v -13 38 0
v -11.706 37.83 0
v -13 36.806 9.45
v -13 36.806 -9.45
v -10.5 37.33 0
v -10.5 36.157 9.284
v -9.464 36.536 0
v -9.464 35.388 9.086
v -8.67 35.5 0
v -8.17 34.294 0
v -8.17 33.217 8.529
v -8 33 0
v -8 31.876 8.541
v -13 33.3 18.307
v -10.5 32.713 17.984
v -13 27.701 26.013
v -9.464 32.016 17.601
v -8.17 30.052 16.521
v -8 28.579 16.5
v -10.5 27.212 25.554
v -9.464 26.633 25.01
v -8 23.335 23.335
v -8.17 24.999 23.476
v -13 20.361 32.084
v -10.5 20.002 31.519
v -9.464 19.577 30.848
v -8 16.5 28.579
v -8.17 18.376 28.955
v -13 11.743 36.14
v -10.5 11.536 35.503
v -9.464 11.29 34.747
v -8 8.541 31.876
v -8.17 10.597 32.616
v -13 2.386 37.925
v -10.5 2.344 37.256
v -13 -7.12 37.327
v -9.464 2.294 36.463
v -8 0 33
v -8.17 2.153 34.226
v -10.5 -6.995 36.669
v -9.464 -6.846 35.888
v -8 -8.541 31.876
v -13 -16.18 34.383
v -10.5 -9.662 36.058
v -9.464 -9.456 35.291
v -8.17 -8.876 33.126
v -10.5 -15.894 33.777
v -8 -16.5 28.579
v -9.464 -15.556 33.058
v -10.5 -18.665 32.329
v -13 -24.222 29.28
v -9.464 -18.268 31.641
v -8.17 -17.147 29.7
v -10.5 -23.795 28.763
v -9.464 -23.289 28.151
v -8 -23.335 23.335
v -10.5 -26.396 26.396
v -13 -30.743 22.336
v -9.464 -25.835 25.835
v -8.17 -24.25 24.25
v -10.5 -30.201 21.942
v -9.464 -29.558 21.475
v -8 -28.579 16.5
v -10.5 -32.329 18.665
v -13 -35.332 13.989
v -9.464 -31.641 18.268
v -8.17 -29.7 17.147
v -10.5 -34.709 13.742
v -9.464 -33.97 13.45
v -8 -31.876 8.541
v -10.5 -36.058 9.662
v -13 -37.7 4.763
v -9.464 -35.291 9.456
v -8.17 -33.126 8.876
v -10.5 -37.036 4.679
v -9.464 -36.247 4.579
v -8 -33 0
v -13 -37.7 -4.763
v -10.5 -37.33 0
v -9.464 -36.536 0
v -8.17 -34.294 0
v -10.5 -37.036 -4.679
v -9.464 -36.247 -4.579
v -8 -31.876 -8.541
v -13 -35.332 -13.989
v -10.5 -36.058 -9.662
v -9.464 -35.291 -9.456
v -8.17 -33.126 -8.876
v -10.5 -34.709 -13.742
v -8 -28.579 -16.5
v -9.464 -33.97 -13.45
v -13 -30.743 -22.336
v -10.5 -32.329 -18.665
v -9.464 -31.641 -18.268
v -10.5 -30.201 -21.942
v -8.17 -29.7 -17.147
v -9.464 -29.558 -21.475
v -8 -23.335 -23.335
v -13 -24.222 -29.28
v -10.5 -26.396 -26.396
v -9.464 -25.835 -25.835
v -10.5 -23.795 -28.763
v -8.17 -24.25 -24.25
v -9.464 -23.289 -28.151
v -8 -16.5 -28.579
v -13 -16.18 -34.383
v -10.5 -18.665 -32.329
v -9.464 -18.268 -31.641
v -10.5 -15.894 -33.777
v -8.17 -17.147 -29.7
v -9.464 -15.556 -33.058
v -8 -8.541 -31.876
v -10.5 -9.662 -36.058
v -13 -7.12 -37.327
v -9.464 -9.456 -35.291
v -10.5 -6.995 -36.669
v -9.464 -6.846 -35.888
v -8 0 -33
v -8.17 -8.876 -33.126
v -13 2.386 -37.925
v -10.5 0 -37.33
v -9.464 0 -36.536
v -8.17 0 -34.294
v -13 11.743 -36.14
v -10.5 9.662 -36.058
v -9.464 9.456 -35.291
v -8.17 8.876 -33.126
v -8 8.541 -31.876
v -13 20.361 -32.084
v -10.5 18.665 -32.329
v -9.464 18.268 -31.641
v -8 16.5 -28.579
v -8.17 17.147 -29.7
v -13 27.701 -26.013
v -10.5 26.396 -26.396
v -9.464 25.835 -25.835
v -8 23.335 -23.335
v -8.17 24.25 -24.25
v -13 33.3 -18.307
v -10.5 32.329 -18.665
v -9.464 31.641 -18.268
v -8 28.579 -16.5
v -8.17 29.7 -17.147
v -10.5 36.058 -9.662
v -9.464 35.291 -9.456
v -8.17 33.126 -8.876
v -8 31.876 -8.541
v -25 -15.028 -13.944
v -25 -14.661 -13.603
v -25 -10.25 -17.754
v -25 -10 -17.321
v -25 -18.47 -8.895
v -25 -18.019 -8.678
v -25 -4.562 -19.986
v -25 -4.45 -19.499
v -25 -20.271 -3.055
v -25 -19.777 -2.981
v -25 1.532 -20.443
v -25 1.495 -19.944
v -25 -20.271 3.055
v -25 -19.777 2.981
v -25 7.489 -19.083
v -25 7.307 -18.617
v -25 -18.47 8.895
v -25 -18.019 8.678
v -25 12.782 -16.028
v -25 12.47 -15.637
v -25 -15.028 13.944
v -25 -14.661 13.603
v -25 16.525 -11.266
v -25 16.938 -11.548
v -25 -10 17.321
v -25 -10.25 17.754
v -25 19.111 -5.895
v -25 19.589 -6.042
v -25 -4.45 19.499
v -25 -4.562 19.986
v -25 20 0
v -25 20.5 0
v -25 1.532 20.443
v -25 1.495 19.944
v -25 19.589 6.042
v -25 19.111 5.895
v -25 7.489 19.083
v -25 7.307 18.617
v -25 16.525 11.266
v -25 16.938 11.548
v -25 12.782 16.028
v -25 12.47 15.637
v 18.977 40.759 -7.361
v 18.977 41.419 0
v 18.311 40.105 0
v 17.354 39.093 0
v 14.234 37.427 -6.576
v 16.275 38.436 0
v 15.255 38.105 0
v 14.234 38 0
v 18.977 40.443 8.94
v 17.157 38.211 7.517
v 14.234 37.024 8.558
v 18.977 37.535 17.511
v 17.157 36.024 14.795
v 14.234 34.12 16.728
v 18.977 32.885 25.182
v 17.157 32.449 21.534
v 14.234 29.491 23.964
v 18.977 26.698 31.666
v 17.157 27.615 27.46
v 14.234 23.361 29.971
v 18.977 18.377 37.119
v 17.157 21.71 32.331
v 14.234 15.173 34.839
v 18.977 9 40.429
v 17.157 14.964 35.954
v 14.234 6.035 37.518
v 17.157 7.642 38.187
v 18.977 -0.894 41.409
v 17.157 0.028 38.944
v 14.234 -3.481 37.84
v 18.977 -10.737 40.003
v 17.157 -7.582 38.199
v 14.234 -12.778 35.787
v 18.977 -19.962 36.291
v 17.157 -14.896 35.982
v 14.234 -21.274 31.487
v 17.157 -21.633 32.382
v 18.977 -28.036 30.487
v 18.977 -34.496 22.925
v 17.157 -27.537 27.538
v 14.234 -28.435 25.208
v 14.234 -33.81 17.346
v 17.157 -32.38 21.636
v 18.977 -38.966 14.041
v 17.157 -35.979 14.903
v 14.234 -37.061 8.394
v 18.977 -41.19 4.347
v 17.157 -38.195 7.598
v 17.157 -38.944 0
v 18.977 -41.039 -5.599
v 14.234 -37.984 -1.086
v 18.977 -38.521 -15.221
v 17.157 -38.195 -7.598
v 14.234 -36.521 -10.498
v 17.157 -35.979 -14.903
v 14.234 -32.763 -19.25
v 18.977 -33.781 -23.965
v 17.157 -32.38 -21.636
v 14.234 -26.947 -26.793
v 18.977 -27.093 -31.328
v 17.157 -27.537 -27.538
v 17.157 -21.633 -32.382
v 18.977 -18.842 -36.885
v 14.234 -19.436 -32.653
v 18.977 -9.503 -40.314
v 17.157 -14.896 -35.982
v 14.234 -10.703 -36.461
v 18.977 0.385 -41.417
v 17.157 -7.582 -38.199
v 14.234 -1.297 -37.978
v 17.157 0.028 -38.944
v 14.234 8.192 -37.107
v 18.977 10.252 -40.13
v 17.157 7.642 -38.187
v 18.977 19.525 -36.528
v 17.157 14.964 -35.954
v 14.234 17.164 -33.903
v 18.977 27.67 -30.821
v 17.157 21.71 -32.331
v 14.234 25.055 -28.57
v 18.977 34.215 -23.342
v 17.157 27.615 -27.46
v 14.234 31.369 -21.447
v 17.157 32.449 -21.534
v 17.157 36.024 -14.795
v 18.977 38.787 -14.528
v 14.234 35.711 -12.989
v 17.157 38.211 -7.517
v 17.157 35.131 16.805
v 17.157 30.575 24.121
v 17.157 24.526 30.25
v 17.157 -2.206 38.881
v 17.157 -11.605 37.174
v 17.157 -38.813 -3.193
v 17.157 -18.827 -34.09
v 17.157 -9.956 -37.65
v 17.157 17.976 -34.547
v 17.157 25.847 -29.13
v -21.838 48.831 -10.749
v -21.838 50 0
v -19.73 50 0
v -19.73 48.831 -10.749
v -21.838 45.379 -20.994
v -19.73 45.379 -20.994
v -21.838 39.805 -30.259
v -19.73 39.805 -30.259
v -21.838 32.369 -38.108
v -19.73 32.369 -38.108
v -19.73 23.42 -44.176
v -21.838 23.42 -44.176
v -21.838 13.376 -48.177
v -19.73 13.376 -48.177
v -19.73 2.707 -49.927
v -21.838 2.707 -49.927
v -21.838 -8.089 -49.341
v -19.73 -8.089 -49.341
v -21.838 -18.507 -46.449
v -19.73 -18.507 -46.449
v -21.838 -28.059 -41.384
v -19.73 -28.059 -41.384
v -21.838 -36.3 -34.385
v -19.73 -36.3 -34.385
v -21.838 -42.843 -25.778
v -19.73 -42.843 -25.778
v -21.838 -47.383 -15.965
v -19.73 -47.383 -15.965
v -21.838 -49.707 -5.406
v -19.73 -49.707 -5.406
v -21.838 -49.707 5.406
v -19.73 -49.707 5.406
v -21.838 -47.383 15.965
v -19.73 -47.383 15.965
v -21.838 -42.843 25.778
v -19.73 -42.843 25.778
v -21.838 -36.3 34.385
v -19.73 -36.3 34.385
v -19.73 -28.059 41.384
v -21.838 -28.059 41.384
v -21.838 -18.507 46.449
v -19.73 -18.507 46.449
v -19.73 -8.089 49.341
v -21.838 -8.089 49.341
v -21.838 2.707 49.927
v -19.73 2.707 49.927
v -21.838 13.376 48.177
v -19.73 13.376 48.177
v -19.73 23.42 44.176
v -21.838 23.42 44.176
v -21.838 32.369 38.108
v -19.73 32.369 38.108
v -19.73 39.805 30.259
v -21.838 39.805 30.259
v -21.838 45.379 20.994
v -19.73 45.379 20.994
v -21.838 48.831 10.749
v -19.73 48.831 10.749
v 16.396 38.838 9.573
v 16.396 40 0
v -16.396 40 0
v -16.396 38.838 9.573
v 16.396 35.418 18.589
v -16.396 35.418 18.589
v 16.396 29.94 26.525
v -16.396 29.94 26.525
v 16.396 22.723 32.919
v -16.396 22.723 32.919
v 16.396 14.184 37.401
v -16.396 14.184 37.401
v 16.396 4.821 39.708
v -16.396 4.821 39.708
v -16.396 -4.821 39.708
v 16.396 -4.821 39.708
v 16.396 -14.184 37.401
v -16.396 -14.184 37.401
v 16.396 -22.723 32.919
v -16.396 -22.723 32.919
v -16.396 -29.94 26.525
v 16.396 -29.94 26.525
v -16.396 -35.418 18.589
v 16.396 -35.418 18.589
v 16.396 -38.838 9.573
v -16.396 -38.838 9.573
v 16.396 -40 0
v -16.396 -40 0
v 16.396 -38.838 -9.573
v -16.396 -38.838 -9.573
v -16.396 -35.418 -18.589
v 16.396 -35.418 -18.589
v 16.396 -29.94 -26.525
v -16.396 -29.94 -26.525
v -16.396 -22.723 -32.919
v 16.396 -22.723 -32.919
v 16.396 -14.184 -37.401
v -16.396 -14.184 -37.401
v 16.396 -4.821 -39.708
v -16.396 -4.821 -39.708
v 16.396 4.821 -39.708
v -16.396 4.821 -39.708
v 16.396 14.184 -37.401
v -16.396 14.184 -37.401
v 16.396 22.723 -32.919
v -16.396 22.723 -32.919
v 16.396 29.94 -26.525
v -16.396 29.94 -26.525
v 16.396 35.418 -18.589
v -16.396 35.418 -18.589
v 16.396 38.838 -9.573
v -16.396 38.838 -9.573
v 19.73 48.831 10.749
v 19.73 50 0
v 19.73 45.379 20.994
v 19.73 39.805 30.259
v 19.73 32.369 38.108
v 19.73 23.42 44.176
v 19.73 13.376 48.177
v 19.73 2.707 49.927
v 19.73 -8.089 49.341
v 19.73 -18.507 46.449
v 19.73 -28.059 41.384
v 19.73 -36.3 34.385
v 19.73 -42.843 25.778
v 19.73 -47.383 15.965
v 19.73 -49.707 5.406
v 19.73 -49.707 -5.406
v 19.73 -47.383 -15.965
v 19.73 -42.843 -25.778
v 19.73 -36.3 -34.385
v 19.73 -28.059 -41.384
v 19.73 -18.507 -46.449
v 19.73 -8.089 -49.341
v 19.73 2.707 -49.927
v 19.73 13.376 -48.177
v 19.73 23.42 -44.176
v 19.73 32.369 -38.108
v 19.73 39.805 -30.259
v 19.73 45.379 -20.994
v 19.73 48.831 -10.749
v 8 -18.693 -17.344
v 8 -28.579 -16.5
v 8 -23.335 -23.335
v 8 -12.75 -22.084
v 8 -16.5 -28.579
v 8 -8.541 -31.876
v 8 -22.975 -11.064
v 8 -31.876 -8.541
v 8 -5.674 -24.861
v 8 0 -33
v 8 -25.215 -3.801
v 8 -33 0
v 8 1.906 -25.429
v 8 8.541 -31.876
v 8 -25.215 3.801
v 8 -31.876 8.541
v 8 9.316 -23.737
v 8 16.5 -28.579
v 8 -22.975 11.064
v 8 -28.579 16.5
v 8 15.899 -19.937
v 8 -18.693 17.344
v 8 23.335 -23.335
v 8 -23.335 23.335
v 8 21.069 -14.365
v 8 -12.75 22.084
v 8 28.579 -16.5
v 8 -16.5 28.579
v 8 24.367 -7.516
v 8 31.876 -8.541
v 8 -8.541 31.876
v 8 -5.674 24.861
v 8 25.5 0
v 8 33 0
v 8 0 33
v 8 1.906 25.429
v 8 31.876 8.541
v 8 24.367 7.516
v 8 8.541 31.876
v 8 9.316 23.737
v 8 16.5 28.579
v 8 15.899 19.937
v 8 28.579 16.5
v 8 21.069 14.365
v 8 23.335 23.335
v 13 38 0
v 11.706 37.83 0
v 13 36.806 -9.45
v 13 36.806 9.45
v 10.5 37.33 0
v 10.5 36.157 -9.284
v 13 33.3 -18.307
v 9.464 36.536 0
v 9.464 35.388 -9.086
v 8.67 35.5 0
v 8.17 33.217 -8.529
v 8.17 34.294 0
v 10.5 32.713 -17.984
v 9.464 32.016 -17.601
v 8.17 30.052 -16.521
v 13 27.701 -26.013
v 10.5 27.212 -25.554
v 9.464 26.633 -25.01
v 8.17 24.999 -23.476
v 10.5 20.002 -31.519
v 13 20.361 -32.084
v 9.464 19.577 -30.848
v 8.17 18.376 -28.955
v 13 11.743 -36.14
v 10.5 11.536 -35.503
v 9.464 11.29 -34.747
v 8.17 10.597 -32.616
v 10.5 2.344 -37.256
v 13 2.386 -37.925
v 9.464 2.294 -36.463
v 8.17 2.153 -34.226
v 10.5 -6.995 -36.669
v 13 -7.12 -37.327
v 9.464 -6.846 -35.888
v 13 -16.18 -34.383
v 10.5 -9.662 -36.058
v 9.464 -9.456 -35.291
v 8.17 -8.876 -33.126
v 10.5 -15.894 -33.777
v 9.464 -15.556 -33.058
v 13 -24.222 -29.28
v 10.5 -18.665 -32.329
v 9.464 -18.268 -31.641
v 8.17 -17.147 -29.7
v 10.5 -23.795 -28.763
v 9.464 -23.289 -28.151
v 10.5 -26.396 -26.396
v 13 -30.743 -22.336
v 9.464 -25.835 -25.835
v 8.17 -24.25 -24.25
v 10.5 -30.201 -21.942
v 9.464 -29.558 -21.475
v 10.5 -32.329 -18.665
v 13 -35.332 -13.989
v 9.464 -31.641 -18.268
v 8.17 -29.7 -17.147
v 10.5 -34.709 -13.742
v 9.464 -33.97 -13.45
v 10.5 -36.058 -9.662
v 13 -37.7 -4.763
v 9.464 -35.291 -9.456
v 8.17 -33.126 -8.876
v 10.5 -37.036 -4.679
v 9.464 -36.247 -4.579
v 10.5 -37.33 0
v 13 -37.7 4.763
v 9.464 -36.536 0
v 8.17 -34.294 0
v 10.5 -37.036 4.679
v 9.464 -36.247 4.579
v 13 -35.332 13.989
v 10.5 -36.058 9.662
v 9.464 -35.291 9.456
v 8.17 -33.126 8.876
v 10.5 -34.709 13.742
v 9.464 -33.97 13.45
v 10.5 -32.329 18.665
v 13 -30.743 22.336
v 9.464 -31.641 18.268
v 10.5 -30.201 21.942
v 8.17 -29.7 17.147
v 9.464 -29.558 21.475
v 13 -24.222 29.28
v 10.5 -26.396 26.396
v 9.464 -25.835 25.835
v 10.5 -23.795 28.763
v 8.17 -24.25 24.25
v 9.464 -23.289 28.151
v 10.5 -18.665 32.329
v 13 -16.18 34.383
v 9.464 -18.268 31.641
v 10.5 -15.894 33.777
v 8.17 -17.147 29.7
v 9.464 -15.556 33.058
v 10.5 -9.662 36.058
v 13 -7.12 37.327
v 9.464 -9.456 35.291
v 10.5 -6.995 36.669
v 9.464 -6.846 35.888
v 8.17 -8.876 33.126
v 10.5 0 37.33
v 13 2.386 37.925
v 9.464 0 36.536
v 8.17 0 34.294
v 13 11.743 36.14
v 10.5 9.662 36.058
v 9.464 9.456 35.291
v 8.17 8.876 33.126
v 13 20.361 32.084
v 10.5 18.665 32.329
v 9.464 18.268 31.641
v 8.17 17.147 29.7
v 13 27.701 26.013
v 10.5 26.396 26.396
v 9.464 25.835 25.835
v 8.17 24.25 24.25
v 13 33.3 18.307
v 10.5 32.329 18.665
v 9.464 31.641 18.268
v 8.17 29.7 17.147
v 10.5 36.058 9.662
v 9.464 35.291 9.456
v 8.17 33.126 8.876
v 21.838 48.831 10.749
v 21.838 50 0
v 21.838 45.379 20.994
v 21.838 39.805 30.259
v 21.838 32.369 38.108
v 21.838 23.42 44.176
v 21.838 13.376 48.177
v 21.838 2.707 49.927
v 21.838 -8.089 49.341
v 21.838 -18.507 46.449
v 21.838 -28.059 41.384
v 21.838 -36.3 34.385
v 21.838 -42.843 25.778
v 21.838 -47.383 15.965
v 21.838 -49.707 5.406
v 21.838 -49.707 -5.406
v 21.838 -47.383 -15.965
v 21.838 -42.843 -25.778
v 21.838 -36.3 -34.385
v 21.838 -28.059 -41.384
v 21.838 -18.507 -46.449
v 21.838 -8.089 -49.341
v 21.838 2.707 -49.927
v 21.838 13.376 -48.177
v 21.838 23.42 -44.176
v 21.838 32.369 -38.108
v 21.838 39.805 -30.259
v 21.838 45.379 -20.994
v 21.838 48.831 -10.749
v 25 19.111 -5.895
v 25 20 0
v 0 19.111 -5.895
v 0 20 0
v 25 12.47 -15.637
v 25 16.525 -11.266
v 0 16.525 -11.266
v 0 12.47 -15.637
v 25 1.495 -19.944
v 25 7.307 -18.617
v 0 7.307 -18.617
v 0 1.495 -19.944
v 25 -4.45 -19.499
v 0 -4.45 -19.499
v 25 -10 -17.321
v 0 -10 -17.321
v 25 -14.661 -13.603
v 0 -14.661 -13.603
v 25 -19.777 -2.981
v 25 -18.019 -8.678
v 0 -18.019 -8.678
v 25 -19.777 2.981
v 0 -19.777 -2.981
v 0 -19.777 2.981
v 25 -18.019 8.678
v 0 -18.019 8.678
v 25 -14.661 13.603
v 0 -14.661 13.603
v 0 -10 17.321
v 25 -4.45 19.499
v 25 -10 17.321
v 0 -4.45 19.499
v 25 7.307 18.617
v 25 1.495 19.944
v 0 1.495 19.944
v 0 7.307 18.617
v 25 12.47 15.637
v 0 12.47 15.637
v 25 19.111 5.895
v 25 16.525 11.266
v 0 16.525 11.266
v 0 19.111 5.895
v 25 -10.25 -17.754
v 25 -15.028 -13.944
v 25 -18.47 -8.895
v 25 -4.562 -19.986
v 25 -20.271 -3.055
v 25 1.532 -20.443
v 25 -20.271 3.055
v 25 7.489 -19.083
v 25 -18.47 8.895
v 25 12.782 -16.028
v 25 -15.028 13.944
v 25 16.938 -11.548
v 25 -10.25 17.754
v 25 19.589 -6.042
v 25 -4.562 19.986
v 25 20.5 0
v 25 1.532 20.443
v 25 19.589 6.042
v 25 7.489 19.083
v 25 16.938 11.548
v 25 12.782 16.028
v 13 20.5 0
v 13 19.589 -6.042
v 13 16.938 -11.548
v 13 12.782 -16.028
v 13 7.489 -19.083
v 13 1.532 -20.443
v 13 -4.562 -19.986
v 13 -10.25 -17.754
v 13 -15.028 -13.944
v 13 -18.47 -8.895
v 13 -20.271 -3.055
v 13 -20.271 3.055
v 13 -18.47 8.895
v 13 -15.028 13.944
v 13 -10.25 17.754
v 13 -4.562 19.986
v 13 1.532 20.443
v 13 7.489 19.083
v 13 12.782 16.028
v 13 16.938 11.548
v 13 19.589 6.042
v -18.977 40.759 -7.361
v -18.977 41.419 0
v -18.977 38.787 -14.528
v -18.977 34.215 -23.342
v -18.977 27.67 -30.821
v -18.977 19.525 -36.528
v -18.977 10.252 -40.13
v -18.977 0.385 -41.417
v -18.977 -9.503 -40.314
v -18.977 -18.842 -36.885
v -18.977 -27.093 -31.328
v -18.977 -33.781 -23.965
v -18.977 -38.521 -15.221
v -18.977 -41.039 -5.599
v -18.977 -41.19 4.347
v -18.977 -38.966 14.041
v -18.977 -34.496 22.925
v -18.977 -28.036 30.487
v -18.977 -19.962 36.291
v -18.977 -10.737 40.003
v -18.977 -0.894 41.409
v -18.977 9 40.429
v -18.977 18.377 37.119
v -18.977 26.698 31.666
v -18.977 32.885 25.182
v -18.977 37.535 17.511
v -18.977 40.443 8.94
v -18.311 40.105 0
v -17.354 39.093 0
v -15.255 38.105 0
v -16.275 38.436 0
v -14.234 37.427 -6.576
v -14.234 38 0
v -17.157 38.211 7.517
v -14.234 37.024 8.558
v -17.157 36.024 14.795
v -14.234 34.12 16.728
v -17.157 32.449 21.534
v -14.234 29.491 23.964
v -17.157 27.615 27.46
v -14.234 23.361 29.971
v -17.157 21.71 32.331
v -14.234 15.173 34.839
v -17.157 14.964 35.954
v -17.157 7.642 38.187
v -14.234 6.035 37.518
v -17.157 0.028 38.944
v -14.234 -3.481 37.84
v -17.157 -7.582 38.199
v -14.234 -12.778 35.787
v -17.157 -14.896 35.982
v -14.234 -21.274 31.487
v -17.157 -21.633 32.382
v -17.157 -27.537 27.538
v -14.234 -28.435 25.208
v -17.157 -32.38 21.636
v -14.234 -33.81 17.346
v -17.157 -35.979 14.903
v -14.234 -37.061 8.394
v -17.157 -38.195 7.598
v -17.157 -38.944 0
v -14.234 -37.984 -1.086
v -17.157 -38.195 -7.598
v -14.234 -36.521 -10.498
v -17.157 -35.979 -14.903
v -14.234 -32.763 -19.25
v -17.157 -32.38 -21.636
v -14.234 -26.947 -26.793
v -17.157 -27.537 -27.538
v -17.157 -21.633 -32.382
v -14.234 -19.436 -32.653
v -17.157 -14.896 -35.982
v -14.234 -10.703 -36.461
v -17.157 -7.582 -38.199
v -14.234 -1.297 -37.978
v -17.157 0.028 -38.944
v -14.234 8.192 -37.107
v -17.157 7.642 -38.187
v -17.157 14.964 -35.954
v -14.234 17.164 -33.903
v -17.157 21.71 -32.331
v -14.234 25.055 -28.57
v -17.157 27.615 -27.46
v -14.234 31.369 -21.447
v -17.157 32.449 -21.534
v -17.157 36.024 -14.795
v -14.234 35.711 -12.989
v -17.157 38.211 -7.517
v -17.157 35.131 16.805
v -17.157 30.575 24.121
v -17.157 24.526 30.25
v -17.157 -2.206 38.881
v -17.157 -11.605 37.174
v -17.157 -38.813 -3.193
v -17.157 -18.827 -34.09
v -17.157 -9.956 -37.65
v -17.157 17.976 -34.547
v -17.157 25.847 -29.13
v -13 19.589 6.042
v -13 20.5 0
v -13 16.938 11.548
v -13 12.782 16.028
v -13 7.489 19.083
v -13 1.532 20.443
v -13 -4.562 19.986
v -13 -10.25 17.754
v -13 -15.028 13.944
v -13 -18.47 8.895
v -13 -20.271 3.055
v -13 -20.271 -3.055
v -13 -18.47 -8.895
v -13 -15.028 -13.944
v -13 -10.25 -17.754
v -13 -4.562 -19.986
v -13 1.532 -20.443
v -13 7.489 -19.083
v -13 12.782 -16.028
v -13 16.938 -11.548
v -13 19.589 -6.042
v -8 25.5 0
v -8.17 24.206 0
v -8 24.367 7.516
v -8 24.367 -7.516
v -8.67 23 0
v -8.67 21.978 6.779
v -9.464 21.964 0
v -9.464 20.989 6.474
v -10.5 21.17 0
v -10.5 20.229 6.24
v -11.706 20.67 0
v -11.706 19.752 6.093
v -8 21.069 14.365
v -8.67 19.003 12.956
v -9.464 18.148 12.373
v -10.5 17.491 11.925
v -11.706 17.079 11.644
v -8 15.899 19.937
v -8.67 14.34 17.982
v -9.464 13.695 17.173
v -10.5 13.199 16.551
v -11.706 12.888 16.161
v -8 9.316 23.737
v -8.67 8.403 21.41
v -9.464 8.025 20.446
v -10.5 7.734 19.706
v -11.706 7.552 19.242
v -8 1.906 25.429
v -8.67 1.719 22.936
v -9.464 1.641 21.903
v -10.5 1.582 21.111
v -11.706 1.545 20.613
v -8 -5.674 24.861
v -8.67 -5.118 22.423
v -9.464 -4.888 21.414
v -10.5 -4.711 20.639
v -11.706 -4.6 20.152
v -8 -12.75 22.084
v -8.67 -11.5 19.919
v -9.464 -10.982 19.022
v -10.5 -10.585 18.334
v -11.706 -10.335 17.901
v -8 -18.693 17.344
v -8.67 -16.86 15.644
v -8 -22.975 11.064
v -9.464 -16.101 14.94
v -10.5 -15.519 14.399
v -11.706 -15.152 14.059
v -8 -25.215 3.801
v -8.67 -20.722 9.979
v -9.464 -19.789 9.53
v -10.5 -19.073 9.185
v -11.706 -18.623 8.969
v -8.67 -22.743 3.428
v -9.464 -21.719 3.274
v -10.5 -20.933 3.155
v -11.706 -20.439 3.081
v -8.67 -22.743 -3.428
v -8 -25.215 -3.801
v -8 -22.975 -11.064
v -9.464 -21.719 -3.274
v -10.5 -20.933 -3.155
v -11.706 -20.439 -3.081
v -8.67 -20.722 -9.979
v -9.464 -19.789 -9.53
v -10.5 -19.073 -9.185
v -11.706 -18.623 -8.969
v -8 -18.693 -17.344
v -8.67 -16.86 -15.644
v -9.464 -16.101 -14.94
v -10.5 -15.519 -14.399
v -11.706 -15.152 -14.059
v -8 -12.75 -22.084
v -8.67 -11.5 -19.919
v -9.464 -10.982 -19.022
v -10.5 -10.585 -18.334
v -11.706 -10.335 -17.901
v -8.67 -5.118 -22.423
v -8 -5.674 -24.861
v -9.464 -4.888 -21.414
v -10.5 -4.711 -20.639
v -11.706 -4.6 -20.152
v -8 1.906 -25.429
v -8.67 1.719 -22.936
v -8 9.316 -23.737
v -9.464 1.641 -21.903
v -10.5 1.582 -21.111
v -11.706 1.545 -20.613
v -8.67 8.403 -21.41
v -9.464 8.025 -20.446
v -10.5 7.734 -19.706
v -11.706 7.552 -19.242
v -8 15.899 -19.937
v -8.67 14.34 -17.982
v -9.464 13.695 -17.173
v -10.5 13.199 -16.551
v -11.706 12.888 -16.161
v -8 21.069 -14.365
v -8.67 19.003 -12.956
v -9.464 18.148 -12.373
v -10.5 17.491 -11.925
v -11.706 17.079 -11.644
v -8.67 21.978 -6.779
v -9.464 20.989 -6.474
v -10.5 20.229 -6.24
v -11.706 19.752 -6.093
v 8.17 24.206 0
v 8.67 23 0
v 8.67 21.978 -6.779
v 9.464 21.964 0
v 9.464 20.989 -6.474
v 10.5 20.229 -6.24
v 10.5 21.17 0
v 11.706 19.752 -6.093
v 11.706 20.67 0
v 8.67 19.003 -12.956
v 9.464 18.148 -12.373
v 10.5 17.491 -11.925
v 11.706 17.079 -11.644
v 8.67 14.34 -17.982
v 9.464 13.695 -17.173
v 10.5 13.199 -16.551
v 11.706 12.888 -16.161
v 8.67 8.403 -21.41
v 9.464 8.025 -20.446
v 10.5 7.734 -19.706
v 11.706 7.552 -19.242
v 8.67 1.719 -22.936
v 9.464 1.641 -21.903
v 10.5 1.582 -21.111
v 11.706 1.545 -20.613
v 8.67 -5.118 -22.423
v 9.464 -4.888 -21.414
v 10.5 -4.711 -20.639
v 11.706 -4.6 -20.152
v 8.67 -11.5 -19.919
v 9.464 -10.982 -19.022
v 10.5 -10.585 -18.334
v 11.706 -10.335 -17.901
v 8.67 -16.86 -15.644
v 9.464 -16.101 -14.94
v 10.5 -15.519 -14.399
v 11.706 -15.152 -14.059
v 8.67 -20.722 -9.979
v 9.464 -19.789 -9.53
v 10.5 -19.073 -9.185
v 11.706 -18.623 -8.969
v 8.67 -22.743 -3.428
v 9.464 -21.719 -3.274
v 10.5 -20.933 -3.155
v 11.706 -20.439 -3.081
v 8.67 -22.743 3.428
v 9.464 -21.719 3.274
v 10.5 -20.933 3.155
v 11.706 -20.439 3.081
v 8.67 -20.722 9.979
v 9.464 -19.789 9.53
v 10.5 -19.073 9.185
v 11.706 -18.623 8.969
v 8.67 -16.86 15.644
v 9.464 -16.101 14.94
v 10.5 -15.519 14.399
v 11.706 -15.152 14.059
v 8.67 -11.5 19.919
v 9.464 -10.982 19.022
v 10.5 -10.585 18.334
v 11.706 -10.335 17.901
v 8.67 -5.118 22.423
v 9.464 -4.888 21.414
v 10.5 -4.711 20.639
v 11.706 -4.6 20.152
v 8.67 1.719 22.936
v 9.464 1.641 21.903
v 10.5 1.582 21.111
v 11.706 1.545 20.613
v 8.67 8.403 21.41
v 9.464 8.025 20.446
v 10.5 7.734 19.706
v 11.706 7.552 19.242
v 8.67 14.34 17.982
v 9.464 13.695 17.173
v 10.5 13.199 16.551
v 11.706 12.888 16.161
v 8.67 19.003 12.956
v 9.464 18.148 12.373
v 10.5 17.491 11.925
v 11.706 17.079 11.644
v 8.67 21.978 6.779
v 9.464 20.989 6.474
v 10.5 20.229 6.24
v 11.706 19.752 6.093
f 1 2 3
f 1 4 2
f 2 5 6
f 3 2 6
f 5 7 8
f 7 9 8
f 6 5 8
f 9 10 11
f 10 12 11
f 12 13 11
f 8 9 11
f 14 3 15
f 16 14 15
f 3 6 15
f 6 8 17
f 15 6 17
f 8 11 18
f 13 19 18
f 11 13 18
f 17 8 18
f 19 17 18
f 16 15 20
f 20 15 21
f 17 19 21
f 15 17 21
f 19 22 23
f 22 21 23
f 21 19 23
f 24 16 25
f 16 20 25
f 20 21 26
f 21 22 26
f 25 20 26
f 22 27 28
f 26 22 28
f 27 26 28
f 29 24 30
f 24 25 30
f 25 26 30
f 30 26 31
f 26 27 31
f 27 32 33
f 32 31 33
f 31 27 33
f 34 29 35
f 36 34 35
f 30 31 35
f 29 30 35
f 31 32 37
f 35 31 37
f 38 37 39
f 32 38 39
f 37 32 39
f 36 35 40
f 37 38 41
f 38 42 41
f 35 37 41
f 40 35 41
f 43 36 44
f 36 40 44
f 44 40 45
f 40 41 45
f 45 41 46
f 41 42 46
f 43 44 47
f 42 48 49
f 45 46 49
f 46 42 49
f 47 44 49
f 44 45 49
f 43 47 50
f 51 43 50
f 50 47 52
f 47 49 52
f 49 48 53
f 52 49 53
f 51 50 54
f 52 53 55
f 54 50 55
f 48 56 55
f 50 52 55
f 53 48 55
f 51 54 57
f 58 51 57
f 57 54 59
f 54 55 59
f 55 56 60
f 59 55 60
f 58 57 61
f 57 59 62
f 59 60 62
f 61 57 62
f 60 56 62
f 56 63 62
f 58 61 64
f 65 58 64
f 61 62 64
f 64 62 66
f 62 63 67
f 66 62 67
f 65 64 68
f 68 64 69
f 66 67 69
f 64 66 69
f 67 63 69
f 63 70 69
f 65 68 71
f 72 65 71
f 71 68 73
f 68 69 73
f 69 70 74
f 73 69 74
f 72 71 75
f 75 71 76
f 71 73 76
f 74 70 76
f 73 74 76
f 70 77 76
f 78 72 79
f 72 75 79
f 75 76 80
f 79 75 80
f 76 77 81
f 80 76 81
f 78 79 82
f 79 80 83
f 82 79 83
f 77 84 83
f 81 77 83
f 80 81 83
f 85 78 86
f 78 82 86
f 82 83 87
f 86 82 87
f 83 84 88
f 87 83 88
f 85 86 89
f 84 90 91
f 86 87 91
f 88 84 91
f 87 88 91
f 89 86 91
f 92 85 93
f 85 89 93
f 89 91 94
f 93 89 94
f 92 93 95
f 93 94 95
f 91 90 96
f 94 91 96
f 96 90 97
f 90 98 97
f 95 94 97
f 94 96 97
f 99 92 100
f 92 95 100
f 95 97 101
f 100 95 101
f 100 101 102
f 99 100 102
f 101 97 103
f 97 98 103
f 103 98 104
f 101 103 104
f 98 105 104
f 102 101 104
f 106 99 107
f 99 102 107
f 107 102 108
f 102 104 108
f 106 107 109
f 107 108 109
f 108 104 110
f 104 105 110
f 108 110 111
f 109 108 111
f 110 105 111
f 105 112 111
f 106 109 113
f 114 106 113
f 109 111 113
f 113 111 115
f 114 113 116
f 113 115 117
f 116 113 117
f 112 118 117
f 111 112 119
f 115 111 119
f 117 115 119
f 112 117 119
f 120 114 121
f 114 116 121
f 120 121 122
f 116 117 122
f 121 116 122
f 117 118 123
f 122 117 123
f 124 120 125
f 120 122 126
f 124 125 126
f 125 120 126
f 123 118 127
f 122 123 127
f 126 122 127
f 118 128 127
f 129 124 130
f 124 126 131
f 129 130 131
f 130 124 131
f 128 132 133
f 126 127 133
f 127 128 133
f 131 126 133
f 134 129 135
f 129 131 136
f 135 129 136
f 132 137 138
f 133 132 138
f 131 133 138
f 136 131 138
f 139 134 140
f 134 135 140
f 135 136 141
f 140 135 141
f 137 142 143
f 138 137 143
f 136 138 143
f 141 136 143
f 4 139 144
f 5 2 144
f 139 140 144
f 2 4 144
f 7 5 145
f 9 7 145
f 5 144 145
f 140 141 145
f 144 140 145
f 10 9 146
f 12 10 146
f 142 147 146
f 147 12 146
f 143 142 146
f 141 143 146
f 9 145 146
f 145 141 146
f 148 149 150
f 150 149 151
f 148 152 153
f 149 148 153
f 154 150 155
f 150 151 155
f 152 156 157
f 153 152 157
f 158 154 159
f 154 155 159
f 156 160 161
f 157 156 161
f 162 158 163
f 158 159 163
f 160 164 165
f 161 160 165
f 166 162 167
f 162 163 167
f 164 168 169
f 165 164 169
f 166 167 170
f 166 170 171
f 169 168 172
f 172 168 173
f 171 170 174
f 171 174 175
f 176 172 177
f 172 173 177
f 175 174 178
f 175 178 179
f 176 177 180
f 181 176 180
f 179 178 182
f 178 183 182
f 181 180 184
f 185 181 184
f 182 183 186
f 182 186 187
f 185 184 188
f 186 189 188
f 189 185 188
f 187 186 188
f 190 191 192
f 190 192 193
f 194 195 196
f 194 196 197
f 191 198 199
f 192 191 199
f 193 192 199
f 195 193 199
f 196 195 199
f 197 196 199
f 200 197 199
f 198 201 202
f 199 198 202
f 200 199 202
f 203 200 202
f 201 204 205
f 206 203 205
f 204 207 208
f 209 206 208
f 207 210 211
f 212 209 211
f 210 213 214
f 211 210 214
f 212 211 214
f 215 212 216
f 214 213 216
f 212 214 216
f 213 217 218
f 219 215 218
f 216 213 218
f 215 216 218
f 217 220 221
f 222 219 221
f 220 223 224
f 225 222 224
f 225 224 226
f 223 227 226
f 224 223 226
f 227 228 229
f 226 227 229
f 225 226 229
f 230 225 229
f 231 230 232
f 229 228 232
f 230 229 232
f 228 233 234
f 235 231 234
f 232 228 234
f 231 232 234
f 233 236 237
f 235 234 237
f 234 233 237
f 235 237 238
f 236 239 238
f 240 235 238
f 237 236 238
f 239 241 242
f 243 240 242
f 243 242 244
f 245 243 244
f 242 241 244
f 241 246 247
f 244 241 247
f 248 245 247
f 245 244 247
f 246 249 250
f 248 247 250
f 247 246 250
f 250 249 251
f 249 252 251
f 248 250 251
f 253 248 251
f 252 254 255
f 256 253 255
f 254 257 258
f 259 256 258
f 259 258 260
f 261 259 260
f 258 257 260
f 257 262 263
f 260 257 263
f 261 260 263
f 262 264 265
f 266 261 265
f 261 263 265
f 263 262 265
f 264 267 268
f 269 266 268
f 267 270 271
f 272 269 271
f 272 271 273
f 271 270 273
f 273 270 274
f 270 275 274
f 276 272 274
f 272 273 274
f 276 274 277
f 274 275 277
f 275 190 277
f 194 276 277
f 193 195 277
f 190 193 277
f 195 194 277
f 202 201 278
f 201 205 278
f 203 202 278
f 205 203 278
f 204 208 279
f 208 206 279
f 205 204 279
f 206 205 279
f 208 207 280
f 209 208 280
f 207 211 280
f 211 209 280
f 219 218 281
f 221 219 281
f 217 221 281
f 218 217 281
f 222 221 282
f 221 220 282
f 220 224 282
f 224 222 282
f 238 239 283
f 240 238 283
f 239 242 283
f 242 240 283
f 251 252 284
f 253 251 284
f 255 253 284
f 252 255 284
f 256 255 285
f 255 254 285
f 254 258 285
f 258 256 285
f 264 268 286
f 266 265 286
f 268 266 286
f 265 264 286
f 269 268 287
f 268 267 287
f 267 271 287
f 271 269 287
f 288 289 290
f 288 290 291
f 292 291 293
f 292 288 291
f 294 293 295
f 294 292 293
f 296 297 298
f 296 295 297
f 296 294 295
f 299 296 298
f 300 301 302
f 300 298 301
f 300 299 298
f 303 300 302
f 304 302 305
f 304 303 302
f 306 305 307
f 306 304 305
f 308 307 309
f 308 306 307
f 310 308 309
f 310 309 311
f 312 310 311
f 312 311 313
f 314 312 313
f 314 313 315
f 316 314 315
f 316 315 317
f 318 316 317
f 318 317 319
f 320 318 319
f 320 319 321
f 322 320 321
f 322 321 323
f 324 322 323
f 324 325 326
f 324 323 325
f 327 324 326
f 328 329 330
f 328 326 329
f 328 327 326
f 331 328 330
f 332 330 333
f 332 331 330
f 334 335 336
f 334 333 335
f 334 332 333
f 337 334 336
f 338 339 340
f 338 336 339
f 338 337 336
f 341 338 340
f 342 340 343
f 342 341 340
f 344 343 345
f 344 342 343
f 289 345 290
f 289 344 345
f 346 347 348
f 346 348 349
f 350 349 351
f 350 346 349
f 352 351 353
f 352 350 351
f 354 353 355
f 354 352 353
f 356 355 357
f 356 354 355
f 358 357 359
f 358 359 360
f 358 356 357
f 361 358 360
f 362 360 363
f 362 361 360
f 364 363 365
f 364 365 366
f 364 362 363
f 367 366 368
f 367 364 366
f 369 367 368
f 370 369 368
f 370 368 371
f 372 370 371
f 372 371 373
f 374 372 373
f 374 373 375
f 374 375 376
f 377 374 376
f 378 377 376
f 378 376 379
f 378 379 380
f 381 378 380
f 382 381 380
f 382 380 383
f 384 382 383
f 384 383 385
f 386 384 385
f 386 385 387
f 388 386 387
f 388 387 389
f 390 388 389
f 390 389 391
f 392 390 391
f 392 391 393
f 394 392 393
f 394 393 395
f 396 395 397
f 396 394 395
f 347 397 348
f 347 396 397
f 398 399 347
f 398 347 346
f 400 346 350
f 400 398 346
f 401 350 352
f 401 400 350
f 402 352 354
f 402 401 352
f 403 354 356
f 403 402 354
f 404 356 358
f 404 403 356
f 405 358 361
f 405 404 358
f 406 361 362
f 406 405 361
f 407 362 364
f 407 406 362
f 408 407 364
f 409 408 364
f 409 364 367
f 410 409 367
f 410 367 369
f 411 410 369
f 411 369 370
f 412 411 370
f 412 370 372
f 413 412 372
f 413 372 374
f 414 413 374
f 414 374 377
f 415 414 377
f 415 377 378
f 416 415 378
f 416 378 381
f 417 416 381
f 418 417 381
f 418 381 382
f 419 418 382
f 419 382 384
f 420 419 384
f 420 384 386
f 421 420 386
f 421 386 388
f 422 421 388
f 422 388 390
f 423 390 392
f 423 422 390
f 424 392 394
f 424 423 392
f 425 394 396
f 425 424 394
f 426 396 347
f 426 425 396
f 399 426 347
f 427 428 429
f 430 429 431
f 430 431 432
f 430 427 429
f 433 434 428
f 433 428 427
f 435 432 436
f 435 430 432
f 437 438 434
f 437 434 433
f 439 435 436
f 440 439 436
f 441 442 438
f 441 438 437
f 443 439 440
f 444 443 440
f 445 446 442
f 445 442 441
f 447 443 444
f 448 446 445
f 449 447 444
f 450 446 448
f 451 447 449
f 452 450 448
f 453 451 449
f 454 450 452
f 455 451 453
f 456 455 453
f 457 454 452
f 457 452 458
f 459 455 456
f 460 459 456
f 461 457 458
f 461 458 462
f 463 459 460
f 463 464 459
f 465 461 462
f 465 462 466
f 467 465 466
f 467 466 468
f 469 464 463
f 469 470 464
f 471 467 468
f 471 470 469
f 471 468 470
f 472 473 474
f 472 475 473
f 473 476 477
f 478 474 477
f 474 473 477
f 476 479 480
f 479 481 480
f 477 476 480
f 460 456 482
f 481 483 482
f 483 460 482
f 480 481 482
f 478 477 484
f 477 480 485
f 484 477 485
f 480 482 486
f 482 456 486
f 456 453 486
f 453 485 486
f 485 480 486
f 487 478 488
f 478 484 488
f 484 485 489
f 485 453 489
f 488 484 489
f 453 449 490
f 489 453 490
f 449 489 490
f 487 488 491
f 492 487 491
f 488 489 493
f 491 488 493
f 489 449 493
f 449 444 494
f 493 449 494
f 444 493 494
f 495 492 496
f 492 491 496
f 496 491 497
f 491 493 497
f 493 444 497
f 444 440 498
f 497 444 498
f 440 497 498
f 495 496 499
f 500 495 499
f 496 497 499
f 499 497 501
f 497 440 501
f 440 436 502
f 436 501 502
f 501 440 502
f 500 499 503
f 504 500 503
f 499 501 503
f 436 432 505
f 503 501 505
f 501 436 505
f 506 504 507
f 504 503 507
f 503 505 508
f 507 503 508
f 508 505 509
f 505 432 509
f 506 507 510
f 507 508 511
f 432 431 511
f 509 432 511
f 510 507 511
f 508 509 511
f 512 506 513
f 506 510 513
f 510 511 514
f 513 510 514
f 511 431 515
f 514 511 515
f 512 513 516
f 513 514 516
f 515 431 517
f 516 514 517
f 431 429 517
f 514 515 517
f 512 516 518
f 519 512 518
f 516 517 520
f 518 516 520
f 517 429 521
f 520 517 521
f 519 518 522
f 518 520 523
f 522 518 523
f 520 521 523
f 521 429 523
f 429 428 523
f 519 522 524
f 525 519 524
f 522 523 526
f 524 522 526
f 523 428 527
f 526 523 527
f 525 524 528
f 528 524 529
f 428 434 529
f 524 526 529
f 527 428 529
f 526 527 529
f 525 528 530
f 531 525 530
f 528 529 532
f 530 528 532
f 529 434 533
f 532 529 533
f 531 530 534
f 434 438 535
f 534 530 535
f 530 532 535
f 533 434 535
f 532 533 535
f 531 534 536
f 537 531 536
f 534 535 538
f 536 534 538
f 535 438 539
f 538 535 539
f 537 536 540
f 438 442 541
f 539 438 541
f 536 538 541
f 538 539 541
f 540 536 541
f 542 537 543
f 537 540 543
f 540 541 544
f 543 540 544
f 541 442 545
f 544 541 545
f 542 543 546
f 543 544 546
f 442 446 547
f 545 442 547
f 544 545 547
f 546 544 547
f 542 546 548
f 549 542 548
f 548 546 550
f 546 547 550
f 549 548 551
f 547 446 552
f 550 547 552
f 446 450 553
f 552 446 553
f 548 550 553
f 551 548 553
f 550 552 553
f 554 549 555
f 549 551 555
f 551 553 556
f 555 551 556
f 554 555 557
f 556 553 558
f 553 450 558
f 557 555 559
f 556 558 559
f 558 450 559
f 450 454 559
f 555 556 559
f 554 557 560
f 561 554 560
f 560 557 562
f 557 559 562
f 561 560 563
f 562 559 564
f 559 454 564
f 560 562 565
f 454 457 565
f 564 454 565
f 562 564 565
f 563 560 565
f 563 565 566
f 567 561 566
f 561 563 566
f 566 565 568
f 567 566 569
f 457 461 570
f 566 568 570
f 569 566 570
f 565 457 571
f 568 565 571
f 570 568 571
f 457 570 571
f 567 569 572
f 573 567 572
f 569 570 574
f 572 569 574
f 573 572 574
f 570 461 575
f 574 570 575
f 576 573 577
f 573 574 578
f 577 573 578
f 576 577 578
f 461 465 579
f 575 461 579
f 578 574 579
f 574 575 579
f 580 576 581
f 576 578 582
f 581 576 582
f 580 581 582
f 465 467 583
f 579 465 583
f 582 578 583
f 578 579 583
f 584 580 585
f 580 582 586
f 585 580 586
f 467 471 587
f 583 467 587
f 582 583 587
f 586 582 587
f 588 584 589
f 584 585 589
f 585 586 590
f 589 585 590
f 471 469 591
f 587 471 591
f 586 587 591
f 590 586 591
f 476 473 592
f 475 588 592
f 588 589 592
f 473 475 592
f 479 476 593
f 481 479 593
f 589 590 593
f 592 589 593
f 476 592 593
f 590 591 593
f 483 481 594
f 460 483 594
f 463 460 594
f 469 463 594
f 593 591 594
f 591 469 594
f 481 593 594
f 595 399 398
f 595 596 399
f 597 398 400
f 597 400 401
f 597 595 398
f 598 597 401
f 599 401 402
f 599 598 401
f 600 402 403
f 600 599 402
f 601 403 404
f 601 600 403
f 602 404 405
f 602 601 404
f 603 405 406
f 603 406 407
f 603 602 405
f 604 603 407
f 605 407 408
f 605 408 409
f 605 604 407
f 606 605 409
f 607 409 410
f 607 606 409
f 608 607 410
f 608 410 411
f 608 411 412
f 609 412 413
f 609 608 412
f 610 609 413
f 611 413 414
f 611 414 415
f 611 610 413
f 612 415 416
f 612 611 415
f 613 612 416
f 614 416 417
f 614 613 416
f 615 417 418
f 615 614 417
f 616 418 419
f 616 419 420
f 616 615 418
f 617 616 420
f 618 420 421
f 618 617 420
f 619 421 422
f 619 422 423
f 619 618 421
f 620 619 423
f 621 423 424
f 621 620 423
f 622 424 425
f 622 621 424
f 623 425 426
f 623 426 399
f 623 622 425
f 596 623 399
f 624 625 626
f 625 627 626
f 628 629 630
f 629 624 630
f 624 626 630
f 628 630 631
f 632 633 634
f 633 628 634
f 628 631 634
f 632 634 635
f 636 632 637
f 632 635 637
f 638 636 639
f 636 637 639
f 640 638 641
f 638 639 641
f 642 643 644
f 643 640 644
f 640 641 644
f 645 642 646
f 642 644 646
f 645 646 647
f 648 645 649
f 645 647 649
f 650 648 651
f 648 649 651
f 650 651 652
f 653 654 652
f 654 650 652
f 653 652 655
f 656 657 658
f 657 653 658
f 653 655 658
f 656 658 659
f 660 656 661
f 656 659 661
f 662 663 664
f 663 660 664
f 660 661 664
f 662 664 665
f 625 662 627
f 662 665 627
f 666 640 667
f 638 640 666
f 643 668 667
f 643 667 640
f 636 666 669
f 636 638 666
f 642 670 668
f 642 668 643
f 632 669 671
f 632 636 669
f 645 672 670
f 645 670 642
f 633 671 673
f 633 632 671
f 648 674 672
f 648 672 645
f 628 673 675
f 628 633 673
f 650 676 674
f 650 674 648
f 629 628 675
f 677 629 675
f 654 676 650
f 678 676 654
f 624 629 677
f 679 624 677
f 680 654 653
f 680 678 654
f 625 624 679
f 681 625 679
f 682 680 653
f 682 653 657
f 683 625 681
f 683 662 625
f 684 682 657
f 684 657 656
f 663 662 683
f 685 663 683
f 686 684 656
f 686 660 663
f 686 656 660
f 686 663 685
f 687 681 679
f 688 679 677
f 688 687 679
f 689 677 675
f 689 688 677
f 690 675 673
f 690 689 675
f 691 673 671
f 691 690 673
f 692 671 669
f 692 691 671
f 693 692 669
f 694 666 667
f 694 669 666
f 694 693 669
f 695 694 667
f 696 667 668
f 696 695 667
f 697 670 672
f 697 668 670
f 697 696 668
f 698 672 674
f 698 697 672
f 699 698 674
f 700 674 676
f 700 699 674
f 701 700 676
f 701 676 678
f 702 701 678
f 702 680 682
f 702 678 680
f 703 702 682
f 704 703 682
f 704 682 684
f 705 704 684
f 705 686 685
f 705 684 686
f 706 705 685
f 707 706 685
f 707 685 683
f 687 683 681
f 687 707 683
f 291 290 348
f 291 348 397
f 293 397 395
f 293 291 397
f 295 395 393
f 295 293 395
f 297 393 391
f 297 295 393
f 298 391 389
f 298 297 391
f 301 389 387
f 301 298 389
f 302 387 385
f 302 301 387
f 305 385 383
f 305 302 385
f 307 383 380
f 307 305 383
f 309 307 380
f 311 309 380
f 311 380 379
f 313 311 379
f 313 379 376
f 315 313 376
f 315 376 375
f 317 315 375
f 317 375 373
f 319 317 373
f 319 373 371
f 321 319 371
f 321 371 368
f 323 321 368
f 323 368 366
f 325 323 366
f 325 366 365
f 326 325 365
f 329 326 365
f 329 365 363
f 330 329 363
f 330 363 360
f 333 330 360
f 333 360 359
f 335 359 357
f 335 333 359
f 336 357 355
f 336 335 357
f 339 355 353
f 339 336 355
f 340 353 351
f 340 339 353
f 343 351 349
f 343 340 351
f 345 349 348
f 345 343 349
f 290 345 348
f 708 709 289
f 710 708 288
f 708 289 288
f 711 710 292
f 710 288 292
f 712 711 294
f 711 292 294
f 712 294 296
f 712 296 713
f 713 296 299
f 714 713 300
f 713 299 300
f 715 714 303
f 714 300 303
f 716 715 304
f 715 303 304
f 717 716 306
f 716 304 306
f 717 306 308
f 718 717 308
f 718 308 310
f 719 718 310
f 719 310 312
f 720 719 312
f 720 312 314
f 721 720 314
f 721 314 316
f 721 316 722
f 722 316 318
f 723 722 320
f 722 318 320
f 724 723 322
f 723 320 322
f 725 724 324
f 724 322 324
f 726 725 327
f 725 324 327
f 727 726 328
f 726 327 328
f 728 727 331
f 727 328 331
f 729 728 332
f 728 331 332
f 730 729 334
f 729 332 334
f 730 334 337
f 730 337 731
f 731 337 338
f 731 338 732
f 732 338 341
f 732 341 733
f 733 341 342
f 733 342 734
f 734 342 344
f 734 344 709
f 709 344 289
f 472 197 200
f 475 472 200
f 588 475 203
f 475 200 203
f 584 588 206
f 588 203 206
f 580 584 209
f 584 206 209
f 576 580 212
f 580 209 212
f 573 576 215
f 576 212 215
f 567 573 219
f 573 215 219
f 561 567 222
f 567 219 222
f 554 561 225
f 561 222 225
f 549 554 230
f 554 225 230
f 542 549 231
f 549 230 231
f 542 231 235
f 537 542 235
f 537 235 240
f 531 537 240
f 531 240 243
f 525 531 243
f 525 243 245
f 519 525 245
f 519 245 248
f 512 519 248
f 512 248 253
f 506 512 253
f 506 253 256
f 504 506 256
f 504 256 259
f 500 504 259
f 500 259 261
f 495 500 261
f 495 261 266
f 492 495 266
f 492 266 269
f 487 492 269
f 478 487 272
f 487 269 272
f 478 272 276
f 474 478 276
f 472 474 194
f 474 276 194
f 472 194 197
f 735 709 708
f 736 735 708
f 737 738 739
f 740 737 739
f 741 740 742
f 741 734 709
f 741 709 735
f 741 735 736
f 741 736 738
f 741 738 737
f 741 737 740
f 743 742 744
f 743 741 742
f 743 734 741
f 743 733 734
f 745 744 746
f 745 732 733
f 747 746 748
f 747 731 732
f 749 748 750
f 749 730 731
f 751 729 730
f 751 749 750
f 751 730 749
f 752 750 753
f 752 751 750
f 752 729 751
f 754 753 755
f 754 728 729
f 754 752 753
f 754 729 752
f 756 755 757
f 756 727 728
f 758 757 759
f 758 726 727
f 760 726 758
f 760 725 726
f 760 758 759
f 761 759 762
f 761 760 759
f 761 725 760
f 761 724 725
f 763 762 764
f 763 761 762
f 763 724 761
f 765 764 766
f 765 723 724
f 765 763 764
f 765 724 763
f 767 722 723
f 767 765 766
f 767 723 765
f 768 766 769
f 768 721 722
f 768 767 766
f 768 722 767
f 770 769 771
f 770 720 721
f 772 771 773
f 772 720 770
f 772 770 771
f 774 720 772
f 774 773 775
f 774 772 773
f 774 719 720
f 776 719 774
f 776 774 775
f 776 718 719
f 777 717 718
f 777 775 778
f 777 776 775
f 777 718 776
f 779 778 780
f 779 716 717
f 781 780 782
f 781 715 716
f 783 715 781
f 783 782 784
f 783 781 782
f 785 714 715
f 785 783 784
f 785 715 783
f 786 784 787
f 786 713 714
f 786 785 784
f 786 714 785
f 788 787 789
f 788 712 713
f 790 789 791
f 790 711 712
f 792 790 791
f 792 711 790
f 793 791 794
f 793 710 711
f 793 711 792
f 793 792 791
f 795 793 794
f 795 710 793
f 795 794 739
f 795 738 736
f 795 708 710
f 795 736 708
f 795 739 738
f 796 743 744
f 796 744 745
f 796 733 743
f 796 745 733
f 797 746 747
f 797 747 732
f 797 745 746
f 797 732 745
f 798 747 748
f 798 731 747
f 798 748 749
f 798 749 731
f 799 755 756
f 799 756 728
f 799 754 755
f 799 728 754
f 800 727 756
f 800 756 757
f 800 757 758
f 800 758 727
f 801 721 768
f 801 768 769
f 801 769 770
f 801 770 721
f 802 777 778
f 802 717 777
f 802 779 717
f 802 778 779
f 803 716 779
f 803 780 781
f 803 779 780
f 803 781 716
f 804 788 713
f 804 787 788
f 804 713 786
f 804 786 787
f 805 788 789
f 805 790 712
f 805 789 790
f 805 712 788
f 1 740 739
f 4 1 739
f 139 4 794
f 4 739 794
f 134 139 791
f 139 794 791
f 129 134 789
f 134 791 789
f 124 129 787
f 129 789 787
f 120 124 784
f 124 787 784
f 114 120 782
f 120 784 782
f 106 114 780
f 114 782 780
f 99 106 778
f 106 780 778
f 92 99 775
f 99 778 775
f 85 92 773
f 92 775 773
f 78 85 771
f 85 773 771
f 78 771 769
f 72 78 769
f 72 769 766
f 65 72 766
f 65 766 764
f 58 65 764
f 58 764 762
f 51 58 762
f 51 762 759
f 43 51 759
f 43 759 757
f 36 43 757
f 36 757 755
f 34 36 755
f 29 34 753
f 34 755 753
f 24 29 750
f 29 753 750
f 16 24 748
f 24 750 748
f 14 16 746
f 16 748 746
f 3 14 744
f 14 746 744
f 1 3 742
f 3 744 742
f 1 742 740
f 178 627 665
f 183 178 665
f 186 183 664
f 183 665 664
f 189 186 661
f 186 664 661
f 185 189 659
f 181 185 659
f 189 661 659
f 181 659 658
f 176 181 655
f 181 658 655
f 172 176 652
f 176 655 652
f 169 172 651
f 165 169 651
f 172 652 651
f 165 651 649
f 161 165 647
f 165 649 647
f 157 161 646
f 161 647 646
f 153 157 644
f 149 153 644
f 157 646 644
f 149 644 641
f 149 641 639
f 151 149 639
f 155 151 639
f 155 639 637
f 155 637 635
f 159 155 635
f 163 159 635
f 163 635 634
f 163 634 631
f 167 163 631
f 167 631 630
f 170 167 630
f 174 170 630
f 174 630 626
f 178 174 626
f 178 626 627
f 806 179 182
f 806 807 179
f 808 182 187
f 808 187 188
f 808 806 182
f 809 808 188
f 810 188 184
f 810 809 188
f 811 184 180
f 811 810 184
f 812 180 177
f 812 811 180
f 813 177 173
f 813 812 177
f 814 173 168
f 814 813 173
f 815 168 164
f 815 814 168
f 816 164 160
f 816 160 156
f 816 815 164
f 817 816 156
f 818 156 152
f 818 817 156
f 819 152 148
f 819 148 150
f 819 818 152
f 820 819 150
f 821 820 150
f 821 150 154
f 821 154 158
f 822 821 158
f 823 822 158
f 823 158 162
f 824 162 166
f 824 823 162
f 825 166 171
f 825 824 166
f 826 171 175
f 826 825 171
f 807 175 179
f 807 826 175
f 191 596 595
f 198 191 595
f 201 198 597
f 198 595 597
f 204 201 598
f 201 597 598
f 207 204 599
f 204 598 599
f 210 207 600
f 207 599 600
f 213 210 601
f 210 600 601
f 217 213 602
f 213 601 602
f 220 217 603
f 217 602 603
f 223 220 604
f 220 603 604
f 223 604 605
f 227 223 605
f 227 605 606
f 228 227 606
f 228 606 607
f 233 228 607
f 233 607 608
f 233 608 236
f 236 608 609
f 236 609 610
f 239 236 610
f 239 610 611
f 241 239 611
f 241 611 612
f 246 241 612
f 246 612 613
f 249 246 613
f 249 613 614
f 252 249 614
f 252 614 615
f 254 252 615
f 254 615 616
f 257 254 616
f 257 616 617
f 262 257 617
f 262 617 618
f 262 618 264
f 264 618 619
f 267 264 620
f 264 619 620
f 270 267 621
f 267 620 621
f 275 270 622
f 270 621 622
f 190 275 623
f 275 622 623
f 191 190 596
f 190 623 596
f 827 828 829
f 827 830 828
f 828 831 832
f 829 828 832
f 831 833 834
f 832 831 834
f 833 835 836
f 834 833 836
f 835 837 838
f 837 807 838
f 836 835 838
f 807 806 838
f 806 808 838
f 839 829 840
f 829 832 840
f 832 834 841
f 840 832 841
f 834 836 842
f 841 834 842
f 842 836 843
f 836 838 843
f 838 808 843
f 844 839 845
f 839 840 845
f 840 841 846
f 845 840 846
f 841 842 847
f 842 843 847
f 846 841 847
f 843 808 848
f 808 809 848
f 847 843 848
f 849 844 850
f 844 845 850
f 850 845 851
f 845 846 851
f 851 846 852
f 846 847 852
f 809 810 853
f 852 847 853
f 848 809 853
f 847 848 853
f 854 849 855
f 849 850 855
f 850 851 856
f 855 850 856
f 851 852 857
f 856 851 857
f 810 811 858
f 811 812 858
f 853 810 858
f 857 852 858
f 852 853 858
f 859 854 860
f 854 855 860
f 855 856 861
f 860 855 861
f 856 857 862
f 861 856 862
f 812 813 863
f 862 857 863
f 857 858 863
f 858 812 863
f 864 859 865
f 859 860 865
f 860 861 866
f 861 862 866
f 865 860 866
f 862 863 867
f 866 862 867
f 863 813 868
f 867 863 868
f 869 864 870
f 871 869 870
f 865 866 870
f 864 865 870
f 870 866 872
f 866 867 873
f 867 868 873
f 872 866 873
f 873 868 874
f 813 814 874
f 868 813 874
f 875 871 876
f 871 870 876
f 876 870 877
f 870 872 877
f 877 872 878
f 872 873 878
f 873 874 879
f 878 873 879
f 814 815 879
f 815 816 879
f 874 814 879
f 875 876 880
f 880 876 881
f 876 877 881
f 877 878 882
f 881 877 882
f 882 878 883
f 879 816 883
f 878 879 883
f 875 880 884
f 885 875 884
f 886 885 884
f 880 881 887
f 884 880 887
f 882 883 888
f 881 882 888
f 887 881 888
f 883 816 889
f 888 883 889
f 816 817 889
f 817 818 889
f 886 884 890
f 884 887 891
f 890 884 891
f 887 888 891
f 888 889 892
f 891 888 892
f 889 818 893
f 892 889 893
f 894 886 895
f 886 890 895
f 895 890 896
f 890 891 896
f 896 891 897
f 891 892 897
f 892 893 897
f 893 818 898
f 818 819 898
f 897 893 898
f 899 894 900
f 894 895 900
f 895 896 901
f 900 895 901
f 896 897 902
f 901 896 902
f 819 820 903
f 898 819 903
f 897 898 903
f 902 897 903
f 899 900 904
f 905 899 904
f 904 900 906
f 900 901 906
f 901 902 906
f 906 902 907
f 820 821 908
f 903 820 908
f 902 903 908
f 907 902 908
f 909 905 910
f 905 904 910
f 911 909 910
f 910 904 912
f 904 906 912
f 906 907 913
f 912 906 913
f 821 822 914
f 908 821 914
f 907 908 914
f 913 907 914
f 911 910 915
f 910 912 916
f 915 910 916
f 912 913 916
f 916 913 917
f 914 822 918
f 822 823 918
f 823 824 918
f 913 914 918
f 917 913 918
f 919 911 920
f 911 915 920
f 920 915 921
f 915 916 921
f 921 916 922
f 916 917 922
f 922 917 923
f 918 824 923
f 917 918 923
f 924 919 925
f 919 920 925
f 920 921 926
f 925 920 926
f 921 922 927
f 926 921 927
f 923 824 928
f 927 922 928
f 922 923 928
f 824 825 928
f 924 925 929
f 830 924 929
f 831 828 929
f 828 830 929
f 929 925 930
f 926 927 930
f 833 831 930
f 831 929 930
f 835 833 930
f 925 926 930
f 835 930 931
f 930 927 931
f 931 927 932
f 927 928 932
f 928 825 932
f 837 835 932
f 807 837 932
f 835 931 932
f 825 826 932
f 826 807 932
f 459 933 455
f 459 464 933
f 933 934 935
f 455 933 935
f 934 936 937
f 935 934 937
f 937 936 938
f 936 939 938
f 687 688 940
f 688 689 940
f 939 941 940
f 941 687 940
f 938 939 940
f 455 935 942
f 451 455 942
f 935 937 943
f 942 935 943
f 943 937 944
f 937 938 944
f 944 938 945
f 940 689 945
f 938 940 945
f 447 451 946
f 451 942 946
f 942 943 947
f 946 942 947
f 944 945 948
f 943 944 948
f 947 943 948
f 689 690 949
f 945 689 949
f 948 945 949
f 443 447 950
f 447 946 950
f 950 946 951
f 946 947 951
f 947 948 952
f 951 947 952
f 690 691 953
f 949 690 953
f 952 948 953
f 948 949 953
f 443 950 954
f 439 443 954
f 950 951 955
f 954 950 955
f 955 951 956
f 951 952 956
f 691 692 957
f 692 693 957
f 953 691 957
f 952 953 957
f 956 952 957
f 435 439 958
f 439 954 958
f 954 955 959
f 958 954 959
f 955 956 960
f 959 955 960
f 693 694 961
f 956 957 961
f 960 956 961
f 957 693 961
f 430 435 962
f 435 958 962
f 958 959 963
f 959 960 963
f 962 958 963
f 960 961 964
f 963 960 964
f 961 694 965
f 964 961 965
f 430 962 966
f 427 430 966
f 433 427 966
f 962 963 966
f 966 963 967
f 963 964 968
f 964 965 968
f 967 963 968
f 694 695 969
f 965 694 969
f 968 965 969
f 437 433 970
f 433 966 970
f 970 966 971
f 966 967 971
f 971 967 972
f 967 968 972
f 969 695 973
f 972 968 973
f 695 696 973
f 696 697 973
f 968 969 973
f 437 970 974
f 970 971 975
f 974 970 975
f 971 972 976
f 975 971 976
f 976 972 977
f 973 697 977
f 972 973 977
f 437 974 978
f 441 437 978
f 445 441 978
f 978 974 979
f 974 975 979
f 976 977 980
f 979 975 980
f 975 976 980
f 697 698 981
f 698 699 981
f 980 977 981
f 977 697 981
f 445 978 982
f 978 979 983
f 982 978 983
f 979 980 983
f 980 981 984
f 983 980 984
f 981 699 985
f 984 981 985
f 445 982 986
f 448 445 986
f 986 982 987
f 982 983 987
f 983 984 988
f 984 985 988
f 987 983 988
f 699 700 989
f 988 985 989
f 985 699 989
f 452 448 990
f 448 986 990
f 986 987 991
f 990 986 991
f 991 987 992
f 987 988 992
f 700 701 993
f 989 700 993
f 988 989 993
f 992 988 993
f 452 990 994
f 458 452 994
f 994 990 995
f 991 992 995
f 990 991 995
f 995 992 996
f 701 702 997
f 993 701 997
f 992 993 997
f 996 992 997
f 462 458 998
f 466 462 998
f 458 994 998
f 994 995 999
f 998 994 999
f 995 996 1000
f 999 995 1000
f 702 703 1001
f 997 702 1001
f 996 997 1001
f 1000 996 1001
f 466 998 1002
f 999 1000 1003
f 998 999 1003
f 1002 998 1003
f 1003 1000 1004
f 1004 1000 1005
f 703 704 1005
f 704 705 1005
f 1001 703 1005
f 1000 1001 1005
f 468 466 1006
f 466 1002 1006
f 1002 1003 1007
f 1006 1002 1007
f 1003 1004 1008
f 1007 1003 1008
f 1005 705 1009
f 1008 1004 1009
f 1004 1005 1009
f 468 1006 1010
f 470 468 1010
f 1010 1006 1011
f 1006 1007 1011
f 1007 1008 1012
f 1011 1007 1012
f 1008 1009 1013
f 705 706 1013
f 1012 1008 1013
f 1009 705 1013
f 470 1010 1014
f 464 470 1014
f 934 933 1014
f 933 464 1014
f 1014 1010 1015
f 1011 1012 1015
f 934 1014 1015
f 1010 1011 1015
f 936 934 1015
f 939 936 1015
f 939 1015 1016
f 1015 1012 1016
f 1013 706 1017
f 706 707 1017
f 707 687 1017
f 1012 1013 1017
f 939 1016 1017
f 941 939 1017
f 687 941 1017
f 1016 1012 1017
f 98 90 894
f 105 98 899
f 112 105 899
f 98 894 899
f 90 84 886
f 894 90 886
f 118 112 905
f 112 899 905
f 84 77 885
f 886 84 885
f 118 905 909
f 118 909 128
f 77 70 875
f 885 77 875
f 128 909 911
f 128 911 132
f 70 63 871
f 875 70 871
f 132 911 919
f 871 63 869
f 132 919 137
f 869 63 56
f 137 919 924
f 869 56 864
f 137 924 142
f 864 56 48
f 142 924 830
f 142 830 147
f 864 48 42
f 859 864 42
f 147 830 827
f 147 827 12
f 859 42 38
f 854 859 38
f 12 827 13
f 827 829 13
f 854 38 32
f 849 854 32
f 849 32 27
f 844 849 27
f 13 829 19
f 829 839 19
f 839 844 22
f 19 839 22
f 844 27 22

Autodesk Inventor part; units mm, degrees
ref_plane "XZ Plane" through (0, 0, 0) normal (0, 1, 0) x (-1, 0, 0)
ref_plane "XY Plane" through (0, 0, 0) normal (0, 0, 1) x (1, 0, 0)
sketch "Sketch1" plane through (0, 0, 0) normal (0, 0, 1) x (1, 0, 0)
  line L0 (-8, 38) -> (-17.8377, 38)
  line L1 (-17.8377, 38) -> (-21.8377, 50)
  line L2 (-19.7295, 50) -> (-21.8377, 50)
  line L3 (-19.7295, 50) -> (-16.3962, 40)
  line L4 (-16.3962, 40) -> (-2.5, 40)
  line L5 (-2.5, 40) -> (0, 40)
  line L6 (-8, 38) -> (-8, 0)
  line L7 (-8, 0) -> (0, 0)
  line L8 (8, 38) -> (17.8377, 38)
  line L9 (17.8377, 38) -> (21.8377, 50)
  line L10 (19.7295, 50) -> (21.8377, 50)
  line L11 (19.7295, 50) -> (16.3962, 40)
  line L12 (16.3962, 40) -> (2.5, 40)
  line L13 (2.5, 40) -> (0, 40)
  line L14 (8, 38) -> (8, 0)
  line L15 (8, 0) -> (0, 0)
  dimension "d14" = 2
ref_plane "Work Plane1" through (0, 0, 0) normal (1, 0, 0) x (0, 1, 0)
revolve "Revolution2" add sketch "Sketch1" angle 360 about axis through (-8, 0, 0) along (1, 0, 0)
fillet "Fillet1" radius 5 1 edges at (17.8377, -38, 0)
fillet "Fillet2" radius 5 1 edges at (-17.8377, -38, 0)
sketch "Sketch2" plane through (0, 0, 0) normal (1, 0, 0) x (0, 1, 0)
  circle A0 centre (0, 0) radius 20.5
  dimension "d11" = 41
extrude "Extrusion1" add sketch "Sketch2" along normal mid plane 50
fillet "Fillet3" radius 5 4 edges at (-8, -38, 0) (-8, -20.5, 0) (8, -38, 0) (8, -20.5, 0)
sketch "Sketch3" plane through (0, 0, 0) normal (1, 0, 0) x (0, 1, 0)
  circle A0 centre (0, 0) radius 20
  dimension "d19" = 40
extrude "Extrusion2" cut sketch "Sketch3" along normal mid plane 50
properties part number "velg" material "Steel, Alloy"
